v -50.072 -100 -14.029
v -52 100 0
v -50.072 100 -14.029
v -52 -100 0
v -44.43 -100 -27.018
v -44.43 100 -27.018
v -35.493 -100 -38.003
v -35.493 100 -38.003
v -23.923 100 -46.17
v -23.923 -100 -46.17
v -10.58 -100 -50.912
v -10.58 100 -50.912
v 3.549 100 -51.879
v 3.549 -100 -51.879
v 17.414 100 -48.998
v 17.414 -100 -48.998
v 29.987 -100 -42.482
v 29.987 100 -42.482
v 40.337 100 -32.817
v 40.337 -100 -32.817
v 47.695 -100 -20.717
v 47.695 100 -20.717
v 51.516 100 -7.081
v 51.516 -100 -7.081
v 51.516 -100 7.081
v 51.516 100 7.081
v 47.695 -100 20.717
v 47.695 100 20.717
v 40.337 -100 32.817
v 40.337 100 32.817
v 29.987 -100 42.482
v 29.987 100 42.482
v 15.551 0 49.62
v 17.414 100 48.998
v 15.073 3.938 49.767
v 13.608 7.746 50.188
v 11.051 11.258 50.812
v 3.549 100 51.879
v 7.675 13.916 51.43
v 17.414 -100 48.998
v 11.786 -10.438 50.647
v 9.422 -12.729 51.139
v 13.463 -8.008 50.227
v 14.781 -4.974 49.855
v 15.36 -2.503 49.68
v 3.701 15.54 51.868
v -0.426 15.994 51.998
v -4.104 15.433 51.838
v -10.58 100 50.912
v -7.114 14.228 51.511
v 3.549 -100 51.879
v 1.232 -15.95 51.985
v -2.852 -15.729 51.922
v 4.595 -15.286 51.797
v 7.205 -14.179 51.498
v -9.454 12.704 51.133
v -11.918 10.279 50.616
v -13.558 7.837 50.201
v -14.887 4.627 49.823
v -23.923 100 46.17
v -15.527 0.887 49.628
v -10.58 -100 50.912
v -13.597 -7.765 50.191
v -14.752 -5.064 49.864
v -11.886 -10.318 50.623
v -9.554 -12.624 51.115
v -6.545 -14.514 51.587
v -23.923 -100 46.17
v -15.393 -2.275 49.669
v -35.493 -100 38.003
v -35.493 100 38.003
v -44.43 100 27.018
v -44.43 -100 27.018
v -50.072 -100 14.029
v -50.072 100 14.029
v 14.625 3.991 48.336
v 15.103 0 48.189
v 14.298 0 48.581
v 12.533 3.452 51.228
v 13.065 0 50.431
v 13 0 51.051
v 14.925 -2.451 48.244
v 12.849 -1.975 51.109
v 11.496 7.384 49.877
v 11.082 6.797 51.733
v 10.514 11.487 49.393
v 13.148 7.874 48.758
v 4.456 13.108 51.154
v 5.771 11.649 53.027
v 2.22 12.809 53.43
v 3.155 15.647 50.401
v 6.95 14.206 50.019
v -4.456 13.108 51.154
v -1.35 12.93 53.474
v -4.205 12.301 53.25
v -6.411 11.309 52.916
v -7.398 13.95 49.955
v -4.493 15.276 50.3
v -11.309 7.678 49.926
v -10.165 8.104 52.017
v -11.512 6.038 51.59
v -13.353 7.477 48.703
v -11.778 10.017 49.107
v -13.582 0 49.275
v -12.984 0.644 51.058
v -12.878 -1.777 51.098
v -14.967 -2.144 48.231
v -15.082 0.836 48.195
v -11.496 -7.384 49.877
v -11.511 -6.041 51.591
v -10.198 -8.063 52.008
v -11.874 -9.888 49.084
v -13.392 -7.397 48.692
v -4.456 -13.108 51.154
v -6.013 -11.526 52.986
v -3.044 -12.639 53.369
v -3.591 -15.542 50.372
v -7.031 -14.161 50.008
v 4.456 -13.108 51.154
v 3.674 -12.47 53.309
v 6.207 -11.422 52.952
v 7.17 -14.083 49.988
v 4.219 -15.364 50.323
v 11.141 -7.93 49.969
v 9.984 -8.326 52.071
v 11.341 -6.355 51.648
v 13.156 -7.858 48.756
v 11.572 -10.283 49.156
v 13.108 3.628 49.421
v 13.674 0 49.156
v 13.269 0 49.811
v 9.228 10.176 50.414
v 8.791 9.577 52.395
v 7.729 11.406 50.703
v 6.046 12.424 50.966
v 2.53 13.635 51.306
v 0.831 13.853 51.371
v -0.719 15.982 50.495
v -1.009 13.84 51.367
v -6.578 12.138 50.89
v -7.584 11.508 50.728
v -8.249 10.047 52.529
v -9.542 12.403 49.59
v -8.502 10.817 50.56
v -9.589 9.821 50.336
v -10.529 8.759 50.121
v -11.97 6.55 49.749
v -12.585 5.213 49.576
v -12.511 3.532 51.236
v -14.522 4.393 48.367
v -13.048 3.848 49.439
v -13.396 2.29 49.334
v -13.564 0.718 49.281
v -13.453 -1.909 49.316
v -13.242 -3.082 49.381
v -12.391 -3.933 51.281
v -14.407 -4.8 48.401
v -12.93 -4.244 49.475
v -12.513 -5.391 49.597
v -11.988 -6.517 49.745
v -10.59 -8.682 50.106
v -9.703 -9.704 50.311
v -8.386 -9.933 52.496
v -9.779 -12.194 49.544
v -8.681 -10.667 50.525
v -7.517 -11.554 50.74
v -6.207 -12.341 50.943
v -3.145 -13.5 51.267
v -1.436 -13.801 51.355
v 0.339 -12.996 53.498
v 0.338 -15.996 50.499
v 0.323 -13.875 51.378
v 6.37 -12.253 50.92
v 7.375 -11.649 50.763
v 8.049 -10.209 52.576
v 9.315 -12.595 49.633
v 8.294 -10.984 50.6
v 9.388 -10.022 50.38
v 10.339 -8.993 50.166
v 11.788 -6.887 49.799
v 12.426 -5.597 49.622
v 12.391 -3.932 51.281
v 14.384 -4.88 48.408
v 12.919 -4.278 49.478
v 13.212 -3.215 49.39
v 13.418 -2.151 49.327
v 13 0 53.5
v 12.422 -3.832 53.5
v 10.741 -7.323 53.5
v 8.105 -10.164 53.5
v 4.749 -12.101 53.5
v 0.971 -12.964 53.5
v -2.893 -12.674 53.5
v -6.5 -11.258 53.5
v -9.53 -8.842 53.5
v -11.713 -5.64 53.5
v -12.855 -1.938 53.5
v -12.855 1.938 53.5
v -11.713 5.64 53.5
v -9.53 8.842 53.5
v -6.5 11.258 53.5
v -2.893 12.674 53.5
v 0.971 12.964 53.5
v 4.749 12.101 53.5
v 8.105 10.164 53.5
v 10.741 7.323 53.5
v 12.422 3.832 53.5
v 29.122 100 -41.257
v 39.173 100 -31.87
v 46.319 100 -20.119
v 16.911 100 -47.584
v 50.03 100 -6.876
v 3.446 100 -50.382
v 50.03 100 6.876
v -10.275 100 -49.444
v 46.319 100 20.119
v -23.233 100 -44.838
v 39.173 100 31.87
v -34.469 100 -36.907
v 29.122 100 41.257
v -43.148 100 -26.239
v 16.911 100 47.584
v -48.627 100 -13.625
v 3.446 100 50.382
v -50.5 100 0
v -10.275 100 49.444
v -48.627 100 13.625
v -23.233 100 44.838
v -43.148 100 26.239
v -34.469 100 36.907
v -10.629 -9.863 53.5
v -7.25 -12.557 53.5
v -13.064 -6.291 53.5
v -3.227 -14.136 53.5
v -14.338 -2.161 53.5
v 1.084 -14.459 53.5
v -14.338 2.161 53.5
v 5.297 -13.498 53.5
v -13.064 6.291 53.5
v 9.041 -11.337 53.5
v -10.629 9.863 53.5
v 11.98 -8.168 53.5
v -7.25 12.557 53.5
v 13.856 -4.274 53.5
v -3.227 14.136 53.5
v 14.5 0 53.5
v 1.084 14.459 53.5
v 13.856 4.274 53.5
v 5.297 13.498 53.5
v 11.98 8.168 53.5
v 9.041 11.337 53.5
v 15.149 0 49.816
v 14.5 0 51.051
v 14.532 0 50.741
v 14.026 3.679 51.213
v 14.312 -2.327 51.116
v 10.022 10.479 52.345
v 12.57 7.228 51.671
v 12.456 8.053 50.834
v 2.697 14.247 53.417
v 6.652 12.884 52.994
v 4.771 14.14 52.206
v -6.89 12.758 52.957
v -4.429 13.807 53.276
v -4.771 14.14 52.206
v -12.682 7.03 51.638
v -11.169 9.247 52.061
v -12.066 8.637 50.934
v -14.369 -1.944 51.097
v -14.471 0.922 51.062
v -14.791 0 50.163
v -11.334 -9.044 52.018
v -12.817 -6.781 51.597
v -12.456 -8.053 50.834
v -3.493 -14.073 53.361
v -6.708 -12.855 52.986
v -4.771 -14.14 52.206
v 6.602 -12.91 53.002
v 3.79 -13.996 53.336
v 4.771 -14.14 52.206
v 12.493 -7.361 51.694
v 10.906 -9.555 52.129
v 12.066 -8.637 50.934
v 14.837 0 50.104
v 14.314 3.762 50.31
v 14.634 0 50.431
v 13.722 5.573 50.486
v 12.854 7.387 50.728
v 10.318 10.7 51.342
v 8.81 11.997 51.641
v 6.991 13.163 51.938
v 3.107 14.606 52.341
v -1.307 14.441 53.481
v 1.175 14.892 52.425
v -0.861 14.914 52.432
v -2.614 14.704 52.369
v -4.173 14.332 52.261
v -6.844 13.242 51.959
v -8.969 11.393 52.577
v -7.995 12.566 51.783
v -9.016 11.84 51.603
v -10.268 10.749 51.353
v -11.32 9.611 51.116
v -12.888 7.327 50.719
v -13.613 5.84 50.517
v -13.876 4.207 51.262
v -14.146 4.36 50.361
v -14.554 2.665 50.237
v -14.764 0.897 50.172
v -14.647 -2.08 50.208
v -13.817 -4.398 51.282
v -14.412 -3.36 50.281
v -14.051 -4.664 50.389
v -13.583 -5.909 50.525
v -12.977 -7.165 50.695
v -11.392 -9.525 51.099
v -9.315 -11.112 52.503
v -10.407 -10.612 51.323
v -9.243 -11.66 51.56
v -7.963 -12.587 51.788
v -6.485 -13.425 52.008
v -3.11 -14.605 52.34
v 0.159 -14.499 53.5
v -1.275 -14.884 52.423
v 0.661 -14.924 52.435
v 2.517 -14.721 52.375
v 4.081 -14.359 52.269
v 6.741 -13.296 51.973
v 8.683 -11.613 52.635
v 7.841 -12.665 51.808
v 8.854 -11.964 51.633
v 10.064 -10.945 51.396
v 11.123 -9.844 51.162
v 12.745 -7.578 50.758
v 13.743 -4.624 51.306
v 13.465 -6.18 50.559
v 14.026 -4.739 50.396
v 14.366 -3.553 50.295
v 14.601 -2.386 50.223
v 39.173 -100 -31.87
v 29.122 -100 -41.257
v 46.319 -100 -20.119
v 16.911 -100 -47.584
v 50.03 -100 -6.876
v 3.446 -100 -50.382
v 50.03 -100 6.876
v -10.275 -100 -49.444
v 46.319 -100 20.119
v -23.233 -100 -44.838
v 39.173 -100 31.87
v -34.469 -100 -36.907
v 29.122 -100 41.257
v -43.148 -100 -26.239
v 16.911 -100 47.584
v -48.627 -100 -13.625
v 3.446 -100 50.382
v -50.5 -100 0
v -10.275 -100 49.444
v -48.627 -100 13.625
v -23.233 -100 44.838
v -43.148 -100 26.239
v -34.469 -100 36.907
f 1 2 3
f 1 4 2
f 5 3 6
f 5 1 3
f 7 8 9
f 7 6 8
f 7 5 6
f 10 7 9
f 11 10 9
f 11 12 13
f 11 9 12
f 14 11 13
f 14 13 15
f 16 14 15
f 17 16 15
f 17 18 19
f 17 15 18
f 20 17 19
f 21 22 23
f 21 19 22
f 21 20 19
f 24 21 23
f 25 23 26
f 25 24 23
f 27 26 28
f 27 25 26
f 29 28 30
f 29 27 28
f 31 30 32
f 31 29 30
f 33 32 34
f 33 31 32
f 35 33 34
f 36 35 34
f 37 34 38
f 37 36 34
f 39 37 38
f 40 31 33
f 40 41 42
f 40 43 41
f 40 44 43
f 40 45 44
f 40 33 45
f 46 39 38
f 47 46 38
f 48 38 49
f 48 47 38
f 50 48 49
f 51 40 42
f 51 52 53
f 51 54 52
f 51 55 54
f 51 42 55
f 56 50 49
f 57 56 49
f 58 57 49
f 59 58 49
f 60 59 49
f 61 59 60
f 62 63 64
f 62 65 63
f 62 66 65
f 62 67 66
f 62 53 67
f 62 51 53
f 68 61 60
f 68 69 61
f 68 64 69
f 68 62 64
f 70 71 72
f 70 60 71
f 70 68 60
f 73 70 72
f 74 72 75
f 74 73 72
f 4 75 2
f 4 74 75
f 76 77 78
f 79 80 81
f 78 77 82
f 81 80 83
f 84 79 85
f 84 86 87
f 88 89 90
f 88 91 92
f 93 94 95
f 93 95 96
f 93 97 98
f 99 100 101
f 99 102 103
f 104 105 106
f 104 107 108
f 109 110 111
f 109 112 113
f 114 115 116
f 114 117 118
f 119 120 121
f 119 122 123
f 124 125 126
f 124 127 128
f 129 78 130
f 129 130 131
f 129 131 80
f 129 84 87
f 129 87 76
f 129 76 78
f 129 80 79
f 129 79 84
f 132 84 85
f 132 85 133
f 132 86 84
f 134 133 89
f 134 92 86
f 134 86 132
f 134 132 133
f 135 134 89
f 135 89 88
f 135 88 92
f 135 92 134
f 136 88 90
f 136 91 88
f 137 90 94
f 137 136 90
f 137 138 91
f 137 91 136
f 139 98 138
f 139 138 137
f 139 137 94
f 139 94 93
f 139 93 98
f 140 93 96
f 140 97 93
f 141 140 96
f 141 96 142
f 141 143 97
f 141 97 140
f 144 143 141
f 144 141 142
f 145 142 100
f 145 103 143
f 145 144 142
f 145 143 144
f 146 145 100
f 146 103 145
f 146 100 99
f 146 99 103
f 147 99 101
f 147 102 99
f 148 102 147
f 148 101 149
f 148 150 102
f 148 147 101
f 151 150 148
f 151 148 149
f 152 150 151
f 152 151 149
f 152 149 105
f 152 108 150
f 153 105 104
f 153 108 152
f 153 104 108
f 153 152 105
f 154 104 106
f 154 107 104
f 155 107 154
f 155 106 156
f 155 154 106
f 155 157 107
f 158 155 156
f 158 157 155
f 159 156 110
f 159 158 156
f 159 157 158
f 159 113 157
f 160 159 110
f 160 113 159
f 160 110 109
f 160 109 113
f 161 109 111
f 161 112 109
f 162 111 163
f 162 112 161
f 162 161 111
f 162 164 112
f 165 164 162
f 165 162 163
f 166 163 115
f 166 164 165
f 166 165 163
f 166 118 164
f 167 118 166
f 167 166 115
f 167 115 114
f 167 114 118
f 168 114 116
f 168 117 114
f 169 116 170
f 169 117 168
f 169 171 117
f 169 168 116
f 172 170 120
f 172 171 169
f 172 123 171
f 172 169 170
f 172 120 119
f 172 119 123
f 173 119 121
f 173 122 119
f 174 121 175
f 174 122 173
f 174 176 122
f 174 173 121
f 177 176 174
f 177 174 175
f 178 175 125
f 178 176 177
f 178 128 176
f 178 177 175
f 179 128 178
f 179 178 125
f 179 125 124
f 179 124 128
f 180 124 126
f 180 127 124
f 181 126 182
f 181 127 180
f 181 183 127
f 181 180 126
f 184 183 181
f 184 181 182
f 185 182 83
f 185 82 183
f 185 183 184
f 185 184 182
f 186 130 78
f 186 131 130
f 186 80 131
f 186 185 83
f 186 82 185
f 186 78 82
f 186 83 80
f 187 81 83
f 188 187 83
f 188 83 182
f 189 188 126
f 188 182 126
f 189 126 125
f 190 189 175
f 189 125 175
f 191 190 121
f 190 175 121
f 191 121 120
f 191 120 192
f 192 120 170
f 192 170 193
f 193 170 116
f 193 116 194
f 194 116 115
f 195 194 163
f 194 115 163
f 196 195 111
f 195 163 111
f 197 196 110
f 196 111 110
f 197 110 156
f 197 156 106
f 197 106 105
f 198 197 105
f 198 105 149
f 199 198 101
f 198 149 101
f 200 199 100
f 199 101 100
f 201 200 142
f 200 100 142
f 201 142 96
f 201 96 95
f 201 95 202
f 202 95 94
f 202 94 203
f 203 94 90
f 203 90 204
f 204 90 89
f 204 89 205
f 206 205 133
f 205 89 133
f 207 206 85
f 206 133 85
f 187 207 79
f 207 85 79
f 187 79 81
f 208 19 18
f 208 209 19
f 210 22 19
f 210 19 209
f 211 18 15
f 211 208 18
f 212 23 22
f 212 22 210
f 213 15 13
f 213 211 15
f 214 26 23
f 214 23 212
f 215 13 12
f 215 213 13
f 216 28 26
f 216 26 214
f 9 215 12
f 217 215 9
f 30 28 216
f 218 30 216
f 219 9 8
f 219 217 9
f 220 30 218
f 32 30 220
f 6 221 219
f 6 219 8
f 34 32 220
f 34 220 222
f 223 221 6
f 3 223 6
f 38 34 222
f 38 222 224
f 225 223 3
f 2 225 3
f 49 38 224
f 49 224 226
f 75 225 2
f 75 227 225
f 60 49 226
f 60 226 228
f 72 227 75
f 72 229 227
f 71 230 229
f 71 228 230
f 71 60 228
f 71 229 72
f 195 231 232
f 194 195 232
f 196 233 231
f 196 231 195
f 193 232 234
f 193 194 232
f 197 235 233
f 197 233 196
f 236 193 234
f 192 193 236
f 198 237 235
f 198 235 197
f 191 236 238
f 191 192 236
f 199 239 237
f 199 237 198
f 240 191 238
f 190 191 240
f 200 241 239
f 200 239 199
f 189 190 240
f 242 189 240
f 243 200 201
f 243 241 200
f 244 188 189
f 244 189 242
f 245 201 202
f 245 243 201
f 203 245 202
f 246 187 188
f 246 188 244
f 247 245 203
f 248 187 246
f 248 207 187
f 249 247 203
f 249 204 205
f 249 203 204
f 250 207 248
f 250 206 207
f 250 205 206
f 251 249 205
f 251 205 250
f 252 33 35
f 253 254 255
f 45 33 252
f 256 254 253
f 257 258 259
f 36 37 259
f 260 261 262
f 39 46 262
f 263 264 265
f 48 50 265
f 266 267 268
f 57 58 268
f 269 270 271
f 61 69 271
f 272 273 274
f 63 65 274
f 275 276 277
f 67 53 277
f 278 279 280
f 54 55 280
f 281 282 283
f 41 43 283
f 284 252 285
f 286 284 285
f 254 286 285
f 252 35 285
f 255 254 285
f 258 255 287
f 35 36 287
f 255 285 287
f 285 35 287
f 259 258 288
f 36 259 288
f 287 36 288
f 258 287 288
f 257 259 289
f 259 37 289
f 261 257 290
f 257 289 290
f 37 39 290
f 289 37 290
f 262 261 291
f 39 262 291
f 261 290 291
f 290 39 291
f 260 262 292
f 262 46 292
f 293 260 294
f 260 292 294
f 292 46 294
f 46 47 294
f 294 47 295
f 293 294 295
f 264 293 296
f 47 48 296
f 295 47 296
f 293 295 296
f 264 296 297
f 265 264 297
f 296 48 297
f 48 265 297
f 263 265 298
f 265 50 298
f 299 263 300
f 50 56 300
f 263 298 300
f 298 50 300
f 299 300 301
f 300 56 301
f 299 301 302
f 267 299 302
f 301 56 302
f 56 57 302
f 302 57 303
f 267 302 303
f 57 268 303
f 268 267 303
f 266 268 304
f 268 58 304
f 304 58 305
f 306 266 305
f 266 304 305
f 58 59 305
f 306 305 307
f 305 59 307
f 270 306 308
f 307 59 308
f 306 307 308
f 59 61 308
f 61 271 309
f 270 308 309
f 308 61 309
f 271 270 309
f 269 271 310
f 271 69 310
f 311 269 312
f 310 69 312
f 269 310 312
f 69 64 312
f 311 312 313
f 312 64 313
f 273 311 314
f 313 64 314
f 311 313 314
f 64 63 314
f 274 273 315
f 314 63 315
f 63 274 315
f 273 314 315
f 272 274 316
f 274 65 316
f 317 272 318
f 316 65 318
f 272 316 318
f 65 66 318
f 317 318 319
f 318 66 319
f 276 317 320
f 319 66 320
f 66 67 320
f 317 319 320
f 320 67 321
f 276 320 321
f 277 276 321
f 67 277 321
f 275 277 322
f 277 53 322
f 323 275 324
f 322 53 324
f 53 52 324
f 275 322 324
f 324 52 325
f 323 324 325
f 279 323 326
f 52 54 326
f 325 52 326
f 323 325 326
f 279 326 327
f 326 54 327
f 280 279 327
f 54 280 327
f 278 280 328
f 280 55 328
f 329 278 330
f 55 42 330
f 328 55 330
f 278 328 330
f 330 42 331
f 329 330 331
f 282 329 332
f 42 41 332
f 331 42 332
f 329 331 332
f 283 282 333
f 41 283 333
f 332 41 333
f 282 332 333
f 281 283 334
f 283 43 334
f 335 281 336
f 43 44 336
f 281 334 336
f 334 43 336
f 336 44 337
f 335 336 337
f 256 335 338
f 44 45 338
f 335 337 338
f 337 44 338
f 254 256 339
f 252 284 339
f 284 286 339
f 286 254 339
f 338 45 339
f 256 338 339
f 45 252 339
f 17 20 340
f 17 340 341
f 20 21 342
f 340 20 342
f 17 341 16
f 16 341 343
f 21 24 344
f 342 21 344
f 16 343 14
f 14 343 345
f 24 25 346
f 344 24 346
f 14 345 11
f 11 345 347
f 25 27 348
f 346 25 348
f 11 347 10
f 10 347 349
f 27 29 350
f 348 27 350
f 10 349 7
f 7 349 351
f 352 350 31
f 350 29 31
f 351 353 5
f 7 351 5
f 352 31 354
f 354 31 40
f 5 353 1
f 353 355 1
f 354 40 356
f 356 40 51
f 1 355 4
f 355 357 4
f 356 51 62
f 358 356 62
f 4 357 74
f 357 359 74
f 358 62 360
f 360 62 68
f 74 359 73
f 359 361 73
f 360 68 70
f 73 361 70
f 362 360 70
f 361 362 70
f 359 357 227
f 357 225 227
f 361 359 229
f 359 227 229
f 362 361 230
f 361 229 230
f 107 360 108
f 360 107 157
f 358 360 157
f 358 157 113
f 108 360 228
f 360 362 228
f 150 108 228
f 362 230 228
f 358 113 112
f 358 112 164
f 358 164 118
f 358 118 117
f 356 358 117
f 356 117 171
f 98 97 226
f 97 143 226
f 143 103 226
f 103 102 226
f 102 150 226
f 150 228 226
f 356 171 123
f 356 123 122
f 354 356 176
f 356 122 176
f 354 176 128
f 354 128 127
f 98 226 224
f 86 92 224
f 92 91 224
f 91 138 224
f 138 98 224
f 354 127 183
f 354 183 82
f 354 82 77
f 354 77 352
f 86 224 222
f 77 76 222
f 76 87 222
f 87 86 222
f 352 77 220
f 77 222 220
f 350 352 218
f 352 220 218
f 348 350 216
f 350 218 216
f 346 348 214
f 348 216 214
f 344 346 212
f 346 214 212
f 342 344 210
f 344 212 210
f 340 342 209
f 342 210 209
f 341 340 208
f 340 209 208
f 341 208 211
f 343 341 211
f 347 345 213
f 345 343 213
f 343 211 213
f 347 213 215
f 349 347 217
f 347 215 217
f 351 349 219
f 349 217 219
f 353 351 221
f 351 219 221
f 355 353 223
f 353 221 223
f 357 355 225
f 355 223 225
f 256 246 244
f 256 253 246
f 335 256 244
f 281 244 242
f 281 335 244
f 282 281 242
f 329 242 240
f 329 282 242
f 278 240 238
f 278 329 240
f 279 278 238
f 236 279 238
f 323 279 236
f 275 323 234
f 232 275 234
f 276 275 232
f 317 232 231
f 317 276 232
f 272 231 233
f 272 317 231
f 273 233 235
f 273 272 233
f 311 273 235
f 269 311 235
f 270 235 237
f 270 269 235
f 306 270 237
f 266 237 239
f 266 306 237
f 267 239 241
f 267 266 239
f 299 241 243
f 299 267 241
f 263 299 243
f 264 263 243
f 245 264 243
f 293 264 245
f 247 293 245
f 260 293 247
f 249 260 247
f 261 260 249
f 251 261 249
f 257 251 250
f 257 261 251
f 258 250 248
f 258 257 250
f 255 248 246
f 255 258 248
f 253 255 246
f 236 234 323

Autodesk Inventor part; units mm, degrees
ref_plane "YZ Plane" through (0, 0, 0) normal (1, 0, 0) x (0, 1, 0)
ref_plane "XZ Plane" through (0, 0, 0) normal (0, 1, 0) x (-1, 0, 0)
ref_plane "XY Plane" through (0, 0, 0) normal (0, 0, 1) x (1, 0, 0)
sketch "Szkic8" plane through (0, 0, 0) normal (0, 1, 0) x (-1, 0, 0)
  circle A0 centre (0, 0) radius 52
  circle A1 centre (0, 0) radius 50.5
  dimension "d53" = 104
  dimension "d54" = 1.5
extrude "Wyciągnięcie proste2" add sketch "Szkic8" along normal mid plane 200
sketch "Szkic13" plane through (0, 0, 0) normal (0, 0, 1) x (1, 0, 0)
  circle A0 centre (0, 0) radius 14.5
  circle A1 centre (0, 0) radius 13
  dimension "d67" = 29
  dimension "d68" = 1.5
extrude "Wyciągnięcie proste6" add sketch "Szkic13" along normal blind 53.5
sketch "Szkic14" plane through (0, 0, 53.5) normal (0, 0, 1) x (1, 0, 0)
  circle A0 centre (0, 0) radius 13 projected
extrude "Wyciągnięcie proste7" cut sketch "Szkic14" against normal blind 53.5
sketch "Szkic15" plane through (0, -100, 0) normal (0, -1, 0) x (1, 0, 0)
  circle A0 centre (0, 0) radius 50.5 projected
extrude "Wyciągnięcie proste8" cut sketch "Szkic15" against normal blind 200
fillet "Zaokrąglenie3" radius 1.5 2 edges at (0, 14.5, 52) (0, -14.5, 52)
fillet "Zaokrąglenie4" radius 3 2 edges at (-0.0027, -13, 50.5) (0, 13, 50.5)
equation "\"d53\" = OD"
equation "\"d54\" = THK"
equation "\"d55\" = L1"
equation "\"d67\" = OD2"
equation "\"d68\" = THK"
equation "\"d69\" = L2"
equation "\"d71\" = L2"
equation "\"d73\" = L1"
equation "\"d75\" = THK"
equation "\"d76\" = 2 * THK"
equation "\"SzerokośćGięciaPodcięcia\" = Grubość"
equation "\"RozmiarPodcięciaNarożnika\" = 4 * Grubość"
equation "\"PromieńPrzejścia\" = PromieńGięcia"
equation "\"Rozmiar_promienia_Jacobiego\" = PromieńGięcia"
equation "\"Wielk_odstępu\" = Grubość"
equation "\"d2\" = PromieńGięcia"
equation "\"d23\" = PromieńGięcia"
equation "\"OD\" = 104"
equation "\"THK\" = 1.5"
equation "\"L1\" = 200"
equation "\"L2\" = 53.5"
equation "\"OD2\" = 29"
equation "\"Grubość\" = 1.5"
equation "\"PromieńGięcia\" = 3"
properties part number "Trójnik red. krótki  Ø104 29 104 s=1,5 L=200" material "304"
